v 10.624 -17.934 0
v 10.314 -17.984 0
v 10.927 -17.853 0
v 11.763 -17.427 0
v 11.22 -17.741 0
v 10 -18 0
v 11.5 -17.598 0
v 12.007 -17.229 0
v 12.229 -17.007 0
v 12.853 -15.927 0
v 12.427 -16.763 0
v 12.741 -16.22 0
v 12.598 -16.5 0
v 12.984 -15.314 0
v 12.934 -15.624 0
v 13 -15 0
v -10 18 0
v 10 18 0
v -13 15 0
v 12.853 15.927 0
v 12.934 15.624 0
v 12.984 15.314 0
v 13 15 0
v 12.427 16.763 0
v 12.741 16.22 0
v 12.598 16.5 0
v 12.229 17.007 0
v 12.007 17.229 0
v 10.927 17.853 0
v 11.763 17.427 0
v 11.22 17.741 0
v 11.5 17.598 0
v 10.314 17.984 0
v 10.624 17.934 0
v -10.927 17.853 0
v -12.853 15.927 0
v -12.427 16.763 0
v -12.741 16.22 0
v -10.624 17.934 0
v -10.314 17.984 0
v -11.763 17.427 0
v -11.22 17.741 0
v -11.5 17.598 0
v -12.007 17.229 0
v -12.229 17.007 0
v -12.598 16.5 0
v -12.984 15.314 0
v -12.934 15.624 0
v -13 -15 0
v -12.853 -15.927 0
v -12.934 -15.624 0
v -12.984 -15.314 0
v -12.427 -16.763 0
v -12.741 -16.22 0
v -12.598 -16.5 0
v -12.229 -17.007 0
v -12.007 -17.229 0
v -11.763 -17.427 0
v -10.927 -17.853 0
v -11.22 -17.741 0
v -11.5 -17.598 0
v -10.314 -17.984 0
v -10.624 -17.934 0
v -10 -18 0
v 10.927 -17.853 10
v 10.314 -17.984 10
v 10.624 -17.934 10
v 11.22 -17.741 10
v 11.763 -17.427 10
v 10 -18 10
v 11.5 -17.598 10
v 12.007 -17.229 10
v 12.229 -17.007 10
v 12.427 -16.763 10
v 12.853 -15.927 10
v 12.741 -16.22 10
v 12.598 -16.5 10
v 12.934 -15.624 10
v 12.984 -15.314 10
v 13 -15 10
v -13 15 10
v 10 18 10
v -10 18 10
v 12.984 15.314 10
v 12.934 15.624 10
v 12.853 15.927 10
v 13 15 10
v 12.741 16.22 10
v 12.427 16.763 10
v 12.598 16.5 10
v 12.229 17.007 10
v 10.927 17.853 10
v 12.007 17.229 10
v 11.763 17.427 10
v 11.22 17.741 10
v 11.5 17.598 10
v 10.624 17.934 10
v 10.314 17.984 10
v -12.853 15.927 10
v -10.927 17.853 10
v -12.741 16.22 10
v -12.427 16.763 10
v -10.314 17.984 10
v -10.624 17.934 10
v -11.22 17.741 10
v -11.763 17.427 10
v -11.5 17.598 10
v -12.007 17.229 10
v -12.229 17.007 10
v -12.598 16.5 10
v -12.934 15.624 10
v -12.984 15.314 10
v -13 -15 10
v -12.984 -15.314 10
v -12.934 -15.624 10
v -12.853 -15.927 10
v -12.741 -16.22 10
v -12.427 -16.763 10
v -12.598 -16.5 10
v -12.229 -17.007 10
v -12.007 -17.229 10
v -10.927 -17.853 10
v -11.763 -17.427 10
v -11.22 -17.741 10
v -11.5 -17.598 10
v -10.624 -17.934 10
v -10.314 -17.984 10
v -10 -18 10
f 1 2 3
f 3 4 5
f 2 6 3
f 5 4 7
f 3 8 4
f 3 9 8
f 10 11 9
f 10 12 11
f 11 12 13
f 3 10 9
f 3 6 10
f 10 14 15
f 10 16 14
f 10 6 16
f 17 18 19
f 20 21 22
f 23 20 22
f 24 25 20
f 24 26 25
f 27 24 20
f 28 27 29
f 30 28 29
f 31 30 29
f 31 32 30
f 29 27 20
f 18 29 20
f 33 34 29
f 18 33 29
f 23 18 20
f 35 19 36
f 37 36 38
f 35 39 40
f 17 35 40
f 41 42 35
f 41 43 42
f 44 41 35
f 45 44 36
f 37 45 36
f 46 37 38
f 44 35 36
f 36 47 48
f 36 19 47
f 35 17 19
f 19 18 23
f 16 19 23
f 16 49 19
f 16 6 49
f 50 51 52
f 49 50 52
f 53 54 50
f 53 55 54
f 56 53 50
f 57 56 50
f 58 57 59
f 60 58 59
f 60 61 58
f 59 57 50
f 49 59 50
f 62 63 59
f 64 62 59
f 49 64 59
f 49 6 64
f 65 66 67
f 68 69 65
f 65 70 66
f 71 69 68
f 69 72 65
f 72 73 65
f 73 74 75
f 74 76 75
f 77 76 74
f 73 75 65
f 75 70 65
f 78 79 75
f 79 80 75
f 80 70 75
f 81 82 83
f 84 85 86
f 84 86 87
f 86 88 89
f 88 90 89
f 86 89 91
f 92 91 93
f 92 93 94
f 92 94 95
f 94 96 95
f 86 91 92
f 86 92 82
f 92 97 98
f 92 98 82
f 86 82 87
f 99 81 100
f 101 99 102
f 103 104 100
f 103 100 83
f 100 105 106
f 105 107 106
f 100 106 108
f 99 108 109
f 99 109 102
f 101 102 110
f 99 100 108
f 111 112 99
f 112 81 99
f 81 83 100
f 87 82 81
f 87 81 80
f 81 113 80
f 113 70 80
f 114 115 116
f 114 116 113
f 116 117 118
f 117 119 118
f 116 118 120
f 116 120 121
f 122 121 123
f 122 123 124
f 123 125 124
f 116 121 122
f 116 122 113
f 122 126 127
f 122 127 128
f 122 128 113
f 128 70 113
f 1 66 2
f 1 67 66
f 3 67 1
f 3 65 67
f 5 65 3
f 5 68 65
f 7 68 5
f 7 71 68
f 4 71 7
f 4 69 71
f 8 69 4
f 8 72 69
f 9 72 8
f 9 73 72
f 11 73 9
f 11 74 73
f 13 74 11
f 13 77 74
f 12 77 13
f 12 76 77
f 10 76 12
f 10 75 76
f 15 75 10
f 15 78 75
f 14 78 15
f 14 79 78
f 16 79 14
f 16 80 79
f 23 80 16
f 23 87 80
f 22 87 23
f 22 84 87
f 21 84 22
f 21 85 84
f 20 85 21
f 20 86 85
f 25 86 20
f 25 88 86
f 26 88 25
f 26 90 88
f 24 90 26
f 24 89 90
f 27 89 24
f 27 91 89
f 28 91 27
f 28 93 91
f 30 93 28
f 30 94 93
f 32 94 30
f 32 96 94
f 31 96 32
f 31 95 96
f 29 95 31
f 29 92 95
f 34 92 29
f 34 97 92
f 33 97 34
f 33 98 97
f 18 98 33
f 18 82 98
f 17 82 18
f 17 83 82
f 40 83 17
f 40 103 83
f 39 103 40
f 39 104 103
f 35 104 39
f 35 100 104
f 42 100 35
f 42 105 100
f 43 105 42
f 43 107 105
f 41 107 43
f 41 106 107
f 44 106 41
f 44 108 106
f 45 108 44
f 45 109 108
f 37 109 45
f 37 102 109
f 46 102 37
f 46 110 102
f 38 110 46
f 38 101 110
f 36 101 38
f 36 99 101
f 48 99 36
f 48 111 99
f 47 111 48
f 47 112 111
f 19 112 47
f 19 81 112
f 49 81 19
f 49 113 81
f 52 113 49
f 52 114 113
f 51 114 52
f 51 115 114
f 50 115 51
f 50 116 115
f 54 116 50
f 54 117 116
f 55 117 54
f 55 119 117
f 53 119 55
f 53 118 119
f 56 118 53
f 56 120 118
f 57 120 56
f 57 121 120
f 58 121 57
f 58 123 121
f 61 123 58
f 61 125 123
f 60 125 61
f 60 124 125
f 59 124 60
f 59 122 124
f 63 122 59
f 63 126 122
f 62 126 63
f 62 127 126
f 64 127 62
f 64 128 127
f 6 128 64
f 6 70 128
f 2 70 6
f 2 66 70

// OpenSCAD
// The rounded box, which is the commonest curved profile there is.
//
// offset(r=) rounds each corner with an arc of exactly that radius: Clipper puts
// the join's points on the circle, on a grid of 2^-27 of a unit, three orders
// finer than the tolerance the recogniser fits with. So the profile carries four
// arcs, one per corner of the square, and the extrusion sweeps four quarter
// cylinders.
//
// Quarter, not whole - so all four are *partial* bands, each bounded by two arcs
// of its rims rather than by closed circles, which is the case step-partial-
// cylinder introduced. Ten faces: four cylinders and six planes, against the
// sixty-six this was before the profile carried anything.
//
// EXPECT: 4 analytic surfaces available (4 cylindrical, 0 spherical, 0 toroidal, 0 Bezier)
// EXPECT: 4 surfaces recognised (0 toroidal, 0 spherical, 0 conical, 4 partial), 60 facets replaced
$fn = 60;
linear_extrude(height = 10) offset(r = 3) square([20, 30], center = true);
